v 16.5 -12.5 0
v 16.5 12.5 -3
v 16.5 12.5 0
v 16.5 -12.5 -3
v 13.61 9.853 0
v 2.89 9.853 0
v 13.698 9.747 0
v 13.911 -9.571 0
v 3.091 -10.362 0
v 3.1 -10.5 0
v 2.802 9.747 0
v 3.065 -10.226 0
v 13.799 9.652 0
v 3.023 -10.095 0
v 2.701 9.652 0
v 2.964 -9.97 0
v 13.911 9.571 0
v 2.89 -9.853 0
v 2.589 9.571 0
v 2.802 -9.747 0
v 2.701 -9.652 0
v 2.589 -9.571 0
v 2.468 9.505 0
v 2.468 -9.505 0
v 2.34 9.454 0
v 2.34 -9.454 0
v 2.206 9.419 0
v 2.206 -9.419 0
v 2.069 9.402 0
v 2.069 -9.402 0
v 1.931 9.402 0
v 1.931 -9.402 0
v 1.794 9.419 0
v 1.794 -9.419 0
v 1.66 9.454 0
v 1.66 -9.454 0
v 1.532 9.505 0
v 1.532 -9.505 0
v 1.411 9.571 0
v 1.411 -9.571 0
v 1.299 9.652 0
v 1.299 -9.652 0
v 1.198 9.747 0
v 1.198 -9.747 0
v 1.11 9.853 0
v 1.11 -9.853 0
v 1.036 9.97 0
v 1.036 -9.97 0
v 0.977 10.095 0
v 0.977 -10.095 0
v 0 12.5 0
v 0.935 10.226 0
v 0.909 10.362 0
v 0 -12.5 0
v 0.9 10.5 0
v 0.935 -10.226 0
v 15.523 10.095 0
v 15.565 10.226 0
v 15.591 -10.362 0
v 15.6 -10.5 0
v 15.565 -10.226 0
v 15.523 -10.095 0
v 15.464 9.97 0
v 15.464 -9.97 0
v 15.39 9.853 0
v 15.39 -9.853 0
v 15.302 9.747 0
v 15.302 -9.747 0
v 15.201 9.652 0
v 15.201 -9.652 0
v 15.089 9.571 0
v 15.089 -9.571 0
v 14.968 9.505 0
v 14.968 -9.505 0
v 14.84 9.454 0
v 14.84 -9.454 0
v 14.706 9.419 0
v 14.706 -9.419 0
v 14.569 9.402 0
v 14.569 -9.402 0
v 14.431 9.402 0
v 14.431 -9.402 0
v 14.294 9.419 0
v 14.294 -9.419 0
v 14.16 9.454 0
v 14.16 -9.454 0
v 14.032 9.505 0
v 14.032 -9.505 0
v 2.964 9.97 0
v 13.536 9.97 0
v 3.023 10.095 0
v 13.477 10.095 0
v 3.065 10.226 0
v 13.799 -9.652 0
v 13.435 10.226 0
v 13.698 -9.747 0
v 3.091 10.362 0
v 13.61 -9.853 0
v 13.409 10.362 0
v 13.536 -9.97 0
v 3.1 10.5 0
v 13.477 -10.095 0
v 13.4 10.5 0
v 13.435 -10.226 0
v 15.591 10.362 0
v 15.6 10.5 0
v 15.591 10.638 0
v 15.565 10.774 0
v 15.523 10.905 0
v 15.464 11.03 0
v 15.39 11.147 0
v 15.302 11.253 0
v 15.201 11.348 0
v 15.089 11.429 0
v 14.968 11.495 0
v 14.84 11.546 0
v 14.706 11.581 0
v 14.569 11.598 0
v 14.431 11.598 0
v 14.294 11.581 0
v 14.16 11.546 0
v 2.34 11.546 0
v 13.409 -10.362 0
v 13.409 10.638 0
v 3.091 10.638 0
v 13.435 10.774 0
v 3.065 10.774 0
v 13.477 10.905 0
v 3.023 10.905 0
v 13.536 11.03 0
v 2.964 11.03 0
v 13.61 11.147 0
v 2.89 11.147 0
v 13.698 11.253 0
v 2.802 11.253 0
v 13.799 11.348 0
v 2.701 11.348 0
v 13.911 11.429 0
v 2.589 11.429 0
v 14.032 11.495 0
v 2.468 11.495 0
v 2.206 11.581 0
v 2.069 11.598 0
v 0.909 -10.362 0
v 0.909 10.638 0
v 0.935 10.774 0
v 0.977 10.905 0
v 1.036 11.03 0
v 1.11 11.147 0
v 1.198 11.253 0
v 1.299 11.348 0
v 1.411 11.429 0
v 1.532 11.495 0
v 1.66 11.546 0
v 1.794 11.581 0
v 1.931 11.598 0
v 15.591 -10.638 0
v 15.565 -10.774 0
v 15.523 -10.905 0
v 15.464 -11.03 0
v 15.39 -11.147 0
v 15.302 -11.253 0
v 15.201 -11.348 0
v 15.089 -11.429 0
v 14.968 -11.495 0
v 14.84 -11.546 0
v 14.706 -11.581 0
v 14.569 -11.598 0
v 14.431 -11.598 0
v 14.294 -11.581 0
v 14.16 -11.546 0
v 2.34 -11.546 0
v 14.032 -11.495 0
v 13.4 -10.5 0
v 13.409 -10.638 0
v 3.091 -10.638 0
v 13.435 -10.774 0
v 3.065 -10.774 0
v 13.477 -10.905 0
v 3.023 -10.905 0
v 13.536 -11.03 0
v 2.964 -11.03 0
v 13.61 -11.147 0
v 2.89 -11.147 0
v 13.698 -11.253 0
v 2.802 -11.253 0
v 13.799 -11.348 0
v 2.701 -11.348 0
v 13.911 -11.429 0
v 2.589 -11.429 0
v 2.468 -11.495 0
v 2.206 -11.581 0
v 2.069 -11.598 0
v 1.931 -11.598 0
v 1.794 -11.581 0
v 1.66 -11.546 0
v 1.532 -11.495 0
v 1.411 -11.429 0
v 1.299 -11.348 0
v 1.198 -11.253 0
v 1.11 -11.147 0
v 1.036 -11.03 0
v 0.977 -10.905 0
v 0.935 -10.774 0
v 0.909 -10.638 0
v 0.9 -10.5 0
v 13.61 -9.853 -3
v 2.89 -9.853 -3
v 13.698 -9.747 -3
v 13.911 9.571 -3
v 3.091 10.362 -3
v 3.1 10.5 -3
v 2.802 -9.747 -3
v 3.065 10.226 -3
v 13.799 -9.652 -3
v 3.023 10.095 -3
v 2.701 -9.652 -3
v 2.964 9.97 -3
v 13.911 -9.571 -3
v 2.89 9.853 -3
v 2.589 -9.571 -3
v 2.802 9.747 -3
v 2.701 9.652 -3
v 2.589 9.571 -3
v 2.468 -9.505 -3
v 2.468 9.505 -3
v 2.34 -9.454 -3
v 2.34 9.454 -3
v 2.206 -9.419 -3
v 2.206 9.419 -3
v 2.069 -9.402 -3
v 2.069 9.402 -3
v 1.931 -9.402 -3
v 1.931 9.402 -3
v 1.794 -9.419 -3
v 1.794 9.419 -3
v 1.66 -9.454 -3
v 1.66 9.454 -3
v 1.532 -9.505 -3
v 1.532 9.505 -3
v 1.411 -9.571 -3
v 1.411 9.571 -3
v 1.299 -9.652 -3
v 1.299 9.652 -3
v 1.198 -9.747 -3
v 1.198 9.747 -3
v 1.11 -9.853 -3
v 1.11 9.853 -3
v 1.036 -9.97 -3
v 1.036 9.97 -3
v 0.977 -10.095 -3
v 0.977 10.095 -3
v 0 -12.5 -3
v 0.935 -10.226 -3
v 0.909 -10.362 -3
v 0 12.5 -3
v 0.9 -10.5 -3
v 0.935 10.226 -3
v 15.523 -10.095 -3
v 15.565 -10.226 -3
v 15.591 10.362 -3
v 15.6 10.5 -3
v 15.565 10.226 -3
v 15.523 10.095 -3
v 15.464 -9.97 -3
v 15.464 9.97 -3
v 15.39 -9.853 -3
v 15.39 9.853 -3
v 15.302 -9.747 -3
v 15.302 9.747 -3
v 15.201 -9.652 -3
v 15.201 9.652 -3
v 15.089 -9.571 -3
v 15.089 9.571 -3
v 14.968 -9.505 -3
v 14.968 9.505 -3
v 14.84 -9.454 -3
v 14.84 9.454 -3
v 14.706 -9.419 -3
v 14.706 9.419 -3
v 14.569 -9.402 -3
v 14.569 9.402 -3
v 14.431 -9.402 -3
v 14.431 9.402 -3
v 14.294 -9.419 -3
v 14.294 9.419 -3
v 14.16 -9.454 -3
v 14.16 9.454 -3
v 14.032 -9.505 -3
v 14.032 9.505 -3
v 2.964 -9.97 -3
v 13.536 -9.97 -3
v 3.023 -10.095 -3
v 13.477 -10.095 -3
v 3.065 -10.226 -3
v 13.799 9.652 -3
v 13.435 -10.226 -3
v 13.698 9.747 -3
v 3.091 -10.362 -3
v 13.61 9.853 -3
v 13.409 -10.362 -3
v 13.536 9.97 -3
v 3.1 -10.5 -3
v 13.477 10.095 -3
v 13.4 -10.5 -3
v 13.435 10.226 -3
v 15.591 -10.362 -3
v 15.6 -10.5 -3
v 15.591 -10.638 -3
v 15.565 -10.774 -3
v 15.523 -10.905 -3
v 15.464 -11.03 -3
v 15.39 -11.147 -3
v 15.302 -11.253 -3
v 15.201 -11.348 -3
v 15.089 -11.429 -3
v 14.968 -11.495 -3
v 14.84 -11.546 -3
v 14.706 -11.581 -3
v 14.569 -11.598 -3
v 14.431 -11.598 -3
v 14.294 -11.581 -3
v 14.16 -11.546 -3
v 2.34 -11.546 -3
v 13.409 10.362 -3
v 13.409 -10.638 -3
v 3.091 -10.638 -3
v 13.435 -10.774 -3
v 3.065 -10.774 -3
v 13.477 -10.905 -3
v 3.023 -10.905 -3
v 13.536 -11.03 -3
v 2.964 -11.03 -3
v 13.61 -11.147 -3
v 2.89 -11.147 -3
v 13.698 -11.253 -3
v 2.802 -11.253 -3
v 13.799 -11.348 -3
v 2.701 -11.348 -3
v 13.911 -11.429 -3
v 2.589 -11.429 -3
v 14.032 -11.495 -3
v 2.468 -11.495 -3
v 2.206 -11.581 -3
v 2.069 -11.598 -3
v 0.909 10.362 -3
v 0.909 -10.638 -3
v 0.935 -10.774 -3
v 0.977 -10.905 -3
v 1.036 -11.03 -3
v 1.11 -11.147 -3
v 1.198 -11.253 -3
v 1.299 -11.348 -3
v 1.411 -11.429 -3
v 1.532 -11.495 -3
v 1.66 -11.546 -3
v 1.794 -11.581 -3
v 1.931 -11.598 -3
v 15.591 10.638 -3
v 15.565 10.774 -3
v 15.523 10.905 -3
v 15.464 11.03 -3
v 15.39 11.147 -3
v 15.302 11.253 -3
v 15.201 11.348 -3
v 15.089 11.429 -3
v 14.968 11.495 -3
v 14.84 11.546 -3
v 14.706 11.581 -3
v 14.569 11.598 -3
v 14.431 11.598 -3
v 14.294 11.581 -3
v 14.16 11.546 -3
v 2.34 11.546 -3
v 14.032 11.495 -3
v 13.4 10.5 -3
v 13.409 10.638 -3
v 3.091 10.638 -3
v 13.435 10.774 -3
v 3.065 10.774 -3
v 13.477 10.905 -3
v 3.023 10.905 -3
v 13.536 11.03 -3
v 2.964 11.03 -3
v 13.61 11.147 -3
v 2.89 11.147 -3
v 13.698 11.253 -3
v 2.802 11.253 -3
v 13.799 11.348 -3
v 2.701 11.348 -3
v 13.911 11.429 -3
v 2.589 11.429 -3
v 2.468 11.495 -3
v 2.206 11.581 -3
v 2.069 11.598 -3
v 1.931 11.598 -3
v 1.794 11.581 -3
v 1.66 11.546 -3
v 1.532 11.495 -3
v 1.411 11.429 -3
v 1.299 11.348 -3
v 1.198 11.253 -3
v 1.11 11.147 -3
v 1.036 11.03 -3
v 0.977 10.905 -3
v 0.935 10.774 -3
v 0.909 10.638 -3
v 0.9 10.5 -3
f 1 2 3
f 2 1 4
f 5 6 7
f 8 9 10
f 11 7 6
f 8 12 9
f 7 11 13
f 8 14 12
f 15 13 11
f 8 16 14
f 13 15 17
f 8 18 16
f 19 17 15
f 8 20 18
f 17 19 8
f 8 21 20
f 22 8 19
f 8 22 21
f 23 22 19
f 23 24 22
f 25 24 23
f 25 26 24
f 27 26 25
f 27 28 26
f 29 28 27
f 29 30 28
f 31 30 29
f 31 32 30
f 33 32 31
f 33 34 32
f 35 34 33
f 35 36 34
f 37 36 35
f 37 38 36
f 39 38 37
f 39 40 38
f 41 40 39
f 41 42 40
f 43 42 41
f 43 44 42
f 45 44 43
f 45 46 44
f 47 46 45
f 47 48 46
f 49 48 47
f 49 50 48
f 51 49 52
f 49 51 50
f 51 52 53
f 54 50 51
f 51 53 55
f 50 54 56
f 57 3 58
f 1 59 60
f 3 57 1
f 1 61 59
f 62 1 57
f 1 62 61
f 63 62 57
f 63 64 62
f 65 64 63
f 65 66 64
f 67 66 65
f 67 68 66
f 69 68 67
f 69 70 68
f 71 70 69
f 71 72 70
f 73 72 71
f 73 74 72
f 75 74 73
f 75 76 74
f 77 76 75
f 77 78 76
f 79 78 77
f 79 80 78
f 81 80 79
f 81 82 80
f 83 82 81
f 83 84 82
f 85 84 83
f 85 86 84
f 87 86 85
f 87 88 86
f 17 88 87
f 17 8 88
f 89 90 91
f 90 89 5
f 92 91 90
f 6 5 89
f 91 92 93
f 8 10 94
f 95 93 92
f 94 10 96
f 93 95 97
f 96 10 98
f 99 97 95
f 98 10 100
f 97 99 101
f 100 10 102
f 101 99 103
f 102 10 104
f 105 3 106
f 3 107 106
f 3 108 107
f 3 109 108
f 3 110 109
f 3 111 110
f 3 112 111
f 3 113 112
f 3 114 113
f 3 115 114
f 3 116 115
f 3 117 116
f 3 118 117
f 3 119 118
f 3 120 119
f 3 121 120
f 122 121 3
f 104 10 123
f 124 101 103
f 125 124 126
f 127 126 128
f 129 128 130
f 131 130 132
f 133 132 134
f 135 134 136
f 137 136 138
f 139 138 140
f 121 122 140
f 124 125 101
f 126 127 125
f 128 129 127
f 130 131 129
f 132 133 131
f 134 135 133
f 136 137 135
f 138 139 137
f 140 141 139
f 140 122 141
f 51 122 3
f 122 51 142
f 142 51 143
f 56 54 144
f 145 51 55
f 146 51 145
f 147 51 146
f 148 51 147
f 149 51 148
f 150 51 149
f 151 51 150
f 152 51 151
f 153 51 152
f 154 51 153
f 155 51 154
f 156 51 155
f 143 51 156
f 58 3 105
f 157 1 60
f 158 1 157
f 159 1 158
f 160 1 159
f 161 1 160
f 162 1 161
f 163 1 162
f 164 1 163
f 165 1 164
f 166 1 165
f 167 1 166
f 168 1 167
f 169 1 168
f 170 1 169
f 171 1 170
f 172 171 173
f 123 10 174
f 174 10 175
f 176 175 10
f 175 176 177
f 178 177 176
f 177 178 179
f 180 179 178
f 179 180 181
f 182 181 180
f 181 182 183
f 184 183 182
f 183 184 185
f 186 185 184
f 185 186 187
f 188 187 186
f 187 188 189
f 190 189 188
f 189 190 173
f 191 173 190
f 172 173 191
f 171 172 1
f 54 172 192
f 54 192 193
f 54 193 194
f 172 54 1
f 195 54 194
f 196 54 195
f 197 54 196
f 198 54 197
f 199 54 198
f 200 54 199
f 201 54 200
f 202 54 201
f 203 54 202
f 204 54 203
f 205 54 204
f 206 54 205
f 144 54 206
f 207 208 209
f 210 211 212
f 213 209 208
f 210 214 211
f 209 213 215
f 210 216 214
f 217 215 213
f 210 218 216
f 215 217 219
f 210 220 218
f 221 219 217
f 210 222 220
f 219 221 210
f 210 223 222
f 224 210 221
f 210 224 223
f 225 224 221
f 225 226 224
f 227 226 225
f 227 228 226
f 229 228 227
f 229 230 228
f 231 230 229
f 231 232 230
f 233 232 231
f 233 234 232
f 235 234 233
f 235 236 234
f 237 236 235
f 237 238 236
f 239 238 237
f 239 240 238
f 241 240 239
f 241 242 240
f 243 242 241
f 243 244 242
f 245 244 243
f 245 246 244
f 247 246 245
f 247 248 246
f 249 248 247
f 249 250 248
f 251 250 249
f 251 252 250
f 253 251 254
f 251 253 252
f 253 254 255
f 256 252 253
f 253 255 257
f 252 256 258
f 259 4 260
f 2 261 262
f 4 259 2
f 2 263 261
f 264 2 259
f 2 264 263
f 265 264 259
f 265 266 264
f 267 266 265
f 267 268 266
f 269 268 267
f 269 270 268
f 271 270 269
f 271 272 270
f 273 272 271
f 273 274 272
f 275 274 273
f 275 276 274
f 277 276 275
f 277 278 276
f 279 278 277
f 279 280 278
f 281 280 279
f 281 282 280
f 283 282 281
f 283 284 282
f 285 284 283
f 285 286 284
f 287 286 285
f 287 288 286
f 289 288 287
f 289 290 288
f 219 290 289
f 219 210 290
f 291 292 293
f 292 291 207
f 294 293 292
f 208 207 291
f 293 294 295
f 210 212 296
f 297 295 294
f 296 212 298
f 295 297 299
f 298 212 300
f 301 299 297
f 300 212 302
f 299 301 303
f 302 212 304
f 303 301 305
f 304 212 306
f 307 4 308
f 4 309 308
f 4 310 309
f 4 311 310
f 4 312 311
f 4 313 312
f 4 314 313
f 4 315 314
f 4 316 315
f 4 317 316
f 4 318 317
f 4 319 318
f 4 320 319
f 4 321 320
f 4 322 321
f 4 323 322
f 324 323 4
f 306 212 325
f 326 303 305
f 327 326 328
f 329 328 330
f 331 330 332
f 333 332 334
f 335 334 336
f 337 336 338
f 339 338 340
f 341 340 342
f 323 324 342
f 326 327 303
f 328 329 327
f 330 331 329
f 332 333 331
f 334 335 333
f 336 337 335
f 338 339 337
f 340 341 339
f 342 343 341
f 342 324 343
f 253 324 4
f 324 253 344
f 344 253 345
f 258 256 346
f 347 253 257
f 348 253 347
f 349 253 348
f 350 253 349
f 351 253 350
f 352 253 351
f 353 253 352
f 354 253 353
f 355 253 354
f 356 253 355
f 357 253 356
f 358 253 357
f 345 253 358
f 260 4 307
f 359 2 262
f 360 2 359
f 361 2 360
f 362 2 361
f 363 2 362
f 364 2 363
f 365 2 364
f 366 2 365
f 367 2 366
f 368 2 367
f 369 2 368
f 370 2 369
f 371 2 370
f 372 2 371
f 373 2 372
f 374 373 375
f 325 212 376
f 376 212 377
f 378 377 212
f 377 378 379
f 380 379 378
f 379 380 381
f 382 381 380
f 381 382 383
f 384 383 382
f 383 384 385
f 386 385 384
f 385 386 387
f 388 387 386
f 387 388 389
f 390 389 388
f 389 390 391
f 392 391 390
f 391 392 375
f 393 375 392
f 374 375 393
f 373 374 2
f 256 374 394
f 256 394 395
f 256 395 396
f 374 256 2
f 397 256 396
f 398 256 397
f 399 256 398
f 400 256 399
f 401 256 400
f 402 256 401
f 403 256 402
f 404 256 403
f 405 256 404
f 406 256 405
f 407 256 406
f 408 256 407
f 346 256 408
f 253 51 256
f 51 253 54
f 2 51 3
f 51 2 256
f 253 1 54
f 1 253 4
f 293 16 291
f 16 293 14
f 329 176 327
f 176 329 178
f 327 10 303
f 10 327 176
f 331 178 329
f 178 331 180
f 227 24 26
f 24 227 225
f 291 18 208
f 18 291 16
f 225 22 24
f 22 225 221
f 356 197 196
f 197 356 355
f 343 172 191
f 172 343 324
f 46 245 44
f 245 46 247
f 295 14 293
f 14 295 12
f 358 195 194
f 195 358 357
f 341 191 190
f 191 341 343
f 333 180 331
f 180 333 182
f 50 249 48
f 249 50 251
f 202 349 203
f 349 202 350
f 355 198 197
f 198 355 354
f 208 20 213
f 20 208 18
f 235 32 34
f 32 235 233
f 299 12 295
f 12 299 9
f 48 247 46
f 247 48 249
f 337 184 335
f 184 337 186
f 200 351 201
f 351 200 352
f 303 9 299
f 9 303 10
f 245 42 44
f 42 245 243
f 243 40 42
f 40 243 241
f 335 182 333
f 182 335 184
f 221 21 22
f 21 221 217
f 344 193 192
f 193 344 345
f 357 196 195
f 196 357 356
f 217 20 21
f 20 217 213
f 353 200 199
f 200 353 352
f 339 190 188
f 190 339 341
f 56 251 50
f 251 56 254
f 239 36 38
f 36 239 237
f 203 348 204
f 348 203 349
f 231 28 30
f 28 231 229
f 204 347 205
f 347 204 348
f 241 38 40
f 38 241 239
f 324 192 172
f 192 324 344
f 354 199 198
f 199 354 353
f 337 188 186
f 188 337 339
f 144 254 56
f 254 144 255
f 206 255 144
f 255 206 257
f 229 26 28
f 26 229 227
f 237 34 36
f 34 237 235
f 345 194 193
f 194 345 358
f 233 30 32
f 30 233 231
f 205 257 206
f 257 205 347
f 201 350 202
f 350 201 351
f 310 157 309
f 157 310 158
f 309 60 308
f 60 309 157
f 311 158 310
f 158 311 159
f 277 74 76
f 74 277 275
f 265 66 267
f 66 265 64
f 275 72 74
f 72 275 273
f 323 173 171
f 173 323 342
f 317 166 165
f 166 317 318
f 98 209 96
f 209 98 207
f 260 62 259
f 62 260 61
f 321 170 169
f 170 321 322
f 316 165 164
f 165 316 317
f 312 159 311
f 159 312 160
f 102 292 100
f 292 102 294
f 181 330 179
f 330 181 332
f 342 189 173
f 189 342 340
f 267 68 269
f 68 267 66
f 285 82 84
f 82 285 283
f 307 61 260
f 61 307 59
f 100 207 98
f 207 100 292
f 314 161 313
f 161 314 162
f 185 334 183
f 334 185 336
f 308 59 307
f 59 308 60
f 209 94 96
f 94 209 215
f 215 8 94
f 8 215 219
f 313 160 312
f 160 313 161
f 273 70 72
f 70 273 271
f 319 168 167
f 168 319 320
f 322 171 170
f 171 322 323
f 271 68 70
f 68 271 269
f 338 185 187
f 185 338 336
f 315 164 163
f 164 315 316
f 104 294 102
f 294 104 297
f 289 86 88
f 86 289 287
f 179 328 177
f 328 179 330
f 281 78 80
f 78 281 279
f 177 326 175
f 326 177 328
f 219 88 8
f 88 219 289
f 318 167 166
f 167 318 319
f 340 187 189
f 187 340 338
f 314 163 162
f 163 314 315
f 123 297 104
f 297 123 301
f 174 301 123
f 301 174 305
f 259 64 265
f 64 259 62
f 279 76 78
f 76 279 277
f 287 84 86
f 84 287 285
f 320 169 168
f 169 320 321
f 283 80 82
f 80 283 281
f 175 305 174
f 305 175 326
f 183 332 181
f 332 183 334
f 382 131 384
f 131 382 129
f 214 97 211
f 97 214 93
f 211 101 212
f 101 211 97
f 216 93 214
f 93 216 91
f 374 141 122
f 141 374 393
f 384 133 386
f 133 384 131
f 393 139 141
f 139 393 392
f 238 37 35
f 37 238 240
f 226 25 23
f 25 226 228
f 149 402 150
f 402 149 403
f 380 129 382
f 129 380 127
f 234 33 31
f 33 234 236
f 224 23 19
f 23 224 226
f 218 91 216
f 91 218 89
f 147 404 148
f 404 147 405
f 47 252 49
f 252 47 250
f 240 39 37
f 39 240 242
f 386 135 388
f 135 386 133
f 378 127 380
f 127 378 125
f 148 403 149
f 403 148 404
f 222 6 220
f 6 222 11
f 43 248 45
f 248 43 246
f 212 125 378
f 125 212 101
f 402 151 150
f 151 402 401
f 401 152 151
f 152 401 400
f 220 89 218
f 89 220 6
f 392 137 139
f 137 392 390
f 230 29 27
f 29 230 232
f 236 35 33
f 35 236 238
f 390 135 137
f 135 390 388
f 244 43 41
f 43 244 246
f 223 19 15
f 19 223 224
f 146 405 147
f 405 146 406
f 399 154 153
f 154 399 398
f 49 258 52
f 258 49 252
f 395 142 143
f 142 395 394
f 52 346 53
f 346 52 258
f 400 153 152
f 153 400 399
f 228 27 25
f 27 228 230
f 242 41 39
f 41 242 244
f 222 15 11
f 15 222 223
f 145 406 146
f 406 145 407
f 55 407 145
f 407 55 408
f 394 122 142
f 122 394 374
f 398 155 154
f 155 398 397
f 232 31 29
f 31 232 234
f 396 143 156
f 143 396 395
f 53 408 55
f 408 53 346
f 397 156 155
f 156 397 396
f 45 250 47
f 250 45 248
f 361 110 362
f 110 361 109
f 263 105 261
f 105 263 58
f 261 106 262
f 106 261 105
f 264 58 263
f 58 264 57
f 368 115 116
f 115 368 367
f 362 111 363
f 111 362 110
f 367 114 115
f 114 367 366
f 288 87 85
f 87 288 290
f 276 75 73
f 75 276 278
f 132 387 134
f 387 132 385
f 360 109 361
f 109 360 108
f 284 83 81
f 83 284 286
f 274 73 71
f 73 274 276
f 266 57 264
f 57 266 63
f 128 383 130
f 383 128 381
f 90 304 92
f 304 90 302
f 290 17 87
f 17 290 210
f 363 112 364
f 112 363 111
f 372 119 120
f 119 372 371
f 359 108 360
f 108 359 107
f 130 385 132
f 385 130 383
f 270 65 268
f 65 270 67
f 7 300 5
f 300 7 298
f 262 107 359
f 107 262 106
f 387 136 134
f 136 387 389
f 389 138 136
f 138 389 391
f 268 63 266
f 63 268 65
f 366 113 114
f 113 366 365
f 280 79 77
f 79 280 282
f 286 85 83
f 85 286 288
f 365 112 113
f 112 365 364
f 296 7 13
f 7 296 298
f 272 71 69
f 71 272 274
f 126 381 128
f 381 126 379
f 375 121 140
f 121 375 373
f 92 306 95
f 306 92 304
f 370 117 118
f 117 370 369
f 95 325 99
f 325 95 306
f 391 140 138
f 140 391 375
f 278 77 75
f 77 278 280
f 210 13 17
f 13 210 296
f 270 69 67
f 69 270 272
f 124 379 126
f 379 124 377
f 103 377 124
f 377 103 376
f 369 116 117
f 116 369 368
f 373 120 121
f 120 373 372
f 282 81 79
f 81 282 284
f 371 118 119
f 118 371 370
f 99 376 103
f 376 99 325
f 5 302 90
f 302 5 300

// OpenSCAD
// file: ../lib/globals.scad
//
// This file is part of the hexapod-robi distribution (https://github.com/schwicke/hexapod-robi).
// Copyright (c) 2021 Ulrich Schwickerath
//
// This program is free software: you can redistribute it and/or modify
// it under the terms of the GNU General Public License as published by
// the Free Software Foundation, version 3.
//
// This program is distributed in the hope that it will be useful, but
// WITHOUT ANY WARRANTY; without even the implied warranty of
// MERCHANTABILITY or FITNESS FOR A PARTICULAR PURPOSE. See the GNU
// General Public License for more details.
//
// You should have received a copy of the GNU General Public License
// along with this program. If not, see <http://www.gnu.org/licenses/>.
//
// This is a little plastic bit which is intended to get the holes for the connectors
// at the right position. It's not part of the robot itself, but useful for building it.
//
//
// all distances are in mm
//

// Define some globals used at various places
raster=2.54;

// motor height
space = 42.0;

// wall thickness
thickness = 4;

// battery box
batt_thickness = 3;
batt_x = 50;
batt_y = 160;
batt_z = 25;

// binder distance
binder_dist = 3.5;

// mount position base
base_mount_pos_x = batt_x/2+2*batt_thickness+1.5;

// dimensions for hubs for motor cabling
hub_hole_diameter = 2;
hub_spacer_height = 2;
hub_x = 4.9;
hub_y = 9.9;

module anchorbox(size){
     cube([40, 30, size],center=true);
}
// main file
//
// This file is part of the hexapod-robi distribution (https://github.com/schwicke/hexapod-robi).
// Copyright (c) 2021 Ulrich Schwickerath
//
// This program is free software: you can redistribute it and/or modify
// it under the terms of the GNU General Public License as published by
// the Free Software Foundation, version 3.
//
// This program is distributed in the hope that it will be useful, but
// WITHOUT ANY WARRANTY; without even the implied warranty of
// MERCHANTABILITY or FITNESS FOR A PARTICULAR PURPOSE. See the GNU
// General Public License for more details.
//
// You should have received a copy of the GNU General Public License
// along with this program. If not, see <http://www.gnu.org/licenses/>.
//
// This is a little plastic bit which is intended to get the holes for the connectors
// at the right position. It's not part of the robot itself, but useful for building it.
//
include <../lib/globals.scad>

//camera module size:
xsize = 14.5+2;
ysize = 25;
thickness = 3;

framesize=5;
// mounting holes distances, 2.2mm diameter each
hdistx=14.5-2;
hdisty=25-4;
// position of first hole
xpos=2;
ypos=2;

translate([0., -ysize/2., -thickness])
  difference(){
    cube([xsize, ysize, thickness], center=false);
    translate([xpos,        ypos, thickness/2])rotate([ 180.0 ,0.0 ,0.0 ])cylinder(h=20, d=2.2, center=true, $fn=50);
    translate([xpos+hdistx, ypos, thickness/2])rotate([ 180.0 ,0.0 ,0.0 ])cylinder(h=20, d=2.2, center=true, $fn=50);
    translate([xpos, ypos+hdisty, thickness/2])rotate([ 180.0 ,0.0 ,0.0 ])cylinder(h=20, d=2.2, center=true, $fn=50);
    translate([xpos+hdistx, ypos+hdisty, thickness/2])rotate([ 180.0 ,0.0 ,0.0 ])cylinder(h=20, d=2.2, center=true, $fn=50);
  }
